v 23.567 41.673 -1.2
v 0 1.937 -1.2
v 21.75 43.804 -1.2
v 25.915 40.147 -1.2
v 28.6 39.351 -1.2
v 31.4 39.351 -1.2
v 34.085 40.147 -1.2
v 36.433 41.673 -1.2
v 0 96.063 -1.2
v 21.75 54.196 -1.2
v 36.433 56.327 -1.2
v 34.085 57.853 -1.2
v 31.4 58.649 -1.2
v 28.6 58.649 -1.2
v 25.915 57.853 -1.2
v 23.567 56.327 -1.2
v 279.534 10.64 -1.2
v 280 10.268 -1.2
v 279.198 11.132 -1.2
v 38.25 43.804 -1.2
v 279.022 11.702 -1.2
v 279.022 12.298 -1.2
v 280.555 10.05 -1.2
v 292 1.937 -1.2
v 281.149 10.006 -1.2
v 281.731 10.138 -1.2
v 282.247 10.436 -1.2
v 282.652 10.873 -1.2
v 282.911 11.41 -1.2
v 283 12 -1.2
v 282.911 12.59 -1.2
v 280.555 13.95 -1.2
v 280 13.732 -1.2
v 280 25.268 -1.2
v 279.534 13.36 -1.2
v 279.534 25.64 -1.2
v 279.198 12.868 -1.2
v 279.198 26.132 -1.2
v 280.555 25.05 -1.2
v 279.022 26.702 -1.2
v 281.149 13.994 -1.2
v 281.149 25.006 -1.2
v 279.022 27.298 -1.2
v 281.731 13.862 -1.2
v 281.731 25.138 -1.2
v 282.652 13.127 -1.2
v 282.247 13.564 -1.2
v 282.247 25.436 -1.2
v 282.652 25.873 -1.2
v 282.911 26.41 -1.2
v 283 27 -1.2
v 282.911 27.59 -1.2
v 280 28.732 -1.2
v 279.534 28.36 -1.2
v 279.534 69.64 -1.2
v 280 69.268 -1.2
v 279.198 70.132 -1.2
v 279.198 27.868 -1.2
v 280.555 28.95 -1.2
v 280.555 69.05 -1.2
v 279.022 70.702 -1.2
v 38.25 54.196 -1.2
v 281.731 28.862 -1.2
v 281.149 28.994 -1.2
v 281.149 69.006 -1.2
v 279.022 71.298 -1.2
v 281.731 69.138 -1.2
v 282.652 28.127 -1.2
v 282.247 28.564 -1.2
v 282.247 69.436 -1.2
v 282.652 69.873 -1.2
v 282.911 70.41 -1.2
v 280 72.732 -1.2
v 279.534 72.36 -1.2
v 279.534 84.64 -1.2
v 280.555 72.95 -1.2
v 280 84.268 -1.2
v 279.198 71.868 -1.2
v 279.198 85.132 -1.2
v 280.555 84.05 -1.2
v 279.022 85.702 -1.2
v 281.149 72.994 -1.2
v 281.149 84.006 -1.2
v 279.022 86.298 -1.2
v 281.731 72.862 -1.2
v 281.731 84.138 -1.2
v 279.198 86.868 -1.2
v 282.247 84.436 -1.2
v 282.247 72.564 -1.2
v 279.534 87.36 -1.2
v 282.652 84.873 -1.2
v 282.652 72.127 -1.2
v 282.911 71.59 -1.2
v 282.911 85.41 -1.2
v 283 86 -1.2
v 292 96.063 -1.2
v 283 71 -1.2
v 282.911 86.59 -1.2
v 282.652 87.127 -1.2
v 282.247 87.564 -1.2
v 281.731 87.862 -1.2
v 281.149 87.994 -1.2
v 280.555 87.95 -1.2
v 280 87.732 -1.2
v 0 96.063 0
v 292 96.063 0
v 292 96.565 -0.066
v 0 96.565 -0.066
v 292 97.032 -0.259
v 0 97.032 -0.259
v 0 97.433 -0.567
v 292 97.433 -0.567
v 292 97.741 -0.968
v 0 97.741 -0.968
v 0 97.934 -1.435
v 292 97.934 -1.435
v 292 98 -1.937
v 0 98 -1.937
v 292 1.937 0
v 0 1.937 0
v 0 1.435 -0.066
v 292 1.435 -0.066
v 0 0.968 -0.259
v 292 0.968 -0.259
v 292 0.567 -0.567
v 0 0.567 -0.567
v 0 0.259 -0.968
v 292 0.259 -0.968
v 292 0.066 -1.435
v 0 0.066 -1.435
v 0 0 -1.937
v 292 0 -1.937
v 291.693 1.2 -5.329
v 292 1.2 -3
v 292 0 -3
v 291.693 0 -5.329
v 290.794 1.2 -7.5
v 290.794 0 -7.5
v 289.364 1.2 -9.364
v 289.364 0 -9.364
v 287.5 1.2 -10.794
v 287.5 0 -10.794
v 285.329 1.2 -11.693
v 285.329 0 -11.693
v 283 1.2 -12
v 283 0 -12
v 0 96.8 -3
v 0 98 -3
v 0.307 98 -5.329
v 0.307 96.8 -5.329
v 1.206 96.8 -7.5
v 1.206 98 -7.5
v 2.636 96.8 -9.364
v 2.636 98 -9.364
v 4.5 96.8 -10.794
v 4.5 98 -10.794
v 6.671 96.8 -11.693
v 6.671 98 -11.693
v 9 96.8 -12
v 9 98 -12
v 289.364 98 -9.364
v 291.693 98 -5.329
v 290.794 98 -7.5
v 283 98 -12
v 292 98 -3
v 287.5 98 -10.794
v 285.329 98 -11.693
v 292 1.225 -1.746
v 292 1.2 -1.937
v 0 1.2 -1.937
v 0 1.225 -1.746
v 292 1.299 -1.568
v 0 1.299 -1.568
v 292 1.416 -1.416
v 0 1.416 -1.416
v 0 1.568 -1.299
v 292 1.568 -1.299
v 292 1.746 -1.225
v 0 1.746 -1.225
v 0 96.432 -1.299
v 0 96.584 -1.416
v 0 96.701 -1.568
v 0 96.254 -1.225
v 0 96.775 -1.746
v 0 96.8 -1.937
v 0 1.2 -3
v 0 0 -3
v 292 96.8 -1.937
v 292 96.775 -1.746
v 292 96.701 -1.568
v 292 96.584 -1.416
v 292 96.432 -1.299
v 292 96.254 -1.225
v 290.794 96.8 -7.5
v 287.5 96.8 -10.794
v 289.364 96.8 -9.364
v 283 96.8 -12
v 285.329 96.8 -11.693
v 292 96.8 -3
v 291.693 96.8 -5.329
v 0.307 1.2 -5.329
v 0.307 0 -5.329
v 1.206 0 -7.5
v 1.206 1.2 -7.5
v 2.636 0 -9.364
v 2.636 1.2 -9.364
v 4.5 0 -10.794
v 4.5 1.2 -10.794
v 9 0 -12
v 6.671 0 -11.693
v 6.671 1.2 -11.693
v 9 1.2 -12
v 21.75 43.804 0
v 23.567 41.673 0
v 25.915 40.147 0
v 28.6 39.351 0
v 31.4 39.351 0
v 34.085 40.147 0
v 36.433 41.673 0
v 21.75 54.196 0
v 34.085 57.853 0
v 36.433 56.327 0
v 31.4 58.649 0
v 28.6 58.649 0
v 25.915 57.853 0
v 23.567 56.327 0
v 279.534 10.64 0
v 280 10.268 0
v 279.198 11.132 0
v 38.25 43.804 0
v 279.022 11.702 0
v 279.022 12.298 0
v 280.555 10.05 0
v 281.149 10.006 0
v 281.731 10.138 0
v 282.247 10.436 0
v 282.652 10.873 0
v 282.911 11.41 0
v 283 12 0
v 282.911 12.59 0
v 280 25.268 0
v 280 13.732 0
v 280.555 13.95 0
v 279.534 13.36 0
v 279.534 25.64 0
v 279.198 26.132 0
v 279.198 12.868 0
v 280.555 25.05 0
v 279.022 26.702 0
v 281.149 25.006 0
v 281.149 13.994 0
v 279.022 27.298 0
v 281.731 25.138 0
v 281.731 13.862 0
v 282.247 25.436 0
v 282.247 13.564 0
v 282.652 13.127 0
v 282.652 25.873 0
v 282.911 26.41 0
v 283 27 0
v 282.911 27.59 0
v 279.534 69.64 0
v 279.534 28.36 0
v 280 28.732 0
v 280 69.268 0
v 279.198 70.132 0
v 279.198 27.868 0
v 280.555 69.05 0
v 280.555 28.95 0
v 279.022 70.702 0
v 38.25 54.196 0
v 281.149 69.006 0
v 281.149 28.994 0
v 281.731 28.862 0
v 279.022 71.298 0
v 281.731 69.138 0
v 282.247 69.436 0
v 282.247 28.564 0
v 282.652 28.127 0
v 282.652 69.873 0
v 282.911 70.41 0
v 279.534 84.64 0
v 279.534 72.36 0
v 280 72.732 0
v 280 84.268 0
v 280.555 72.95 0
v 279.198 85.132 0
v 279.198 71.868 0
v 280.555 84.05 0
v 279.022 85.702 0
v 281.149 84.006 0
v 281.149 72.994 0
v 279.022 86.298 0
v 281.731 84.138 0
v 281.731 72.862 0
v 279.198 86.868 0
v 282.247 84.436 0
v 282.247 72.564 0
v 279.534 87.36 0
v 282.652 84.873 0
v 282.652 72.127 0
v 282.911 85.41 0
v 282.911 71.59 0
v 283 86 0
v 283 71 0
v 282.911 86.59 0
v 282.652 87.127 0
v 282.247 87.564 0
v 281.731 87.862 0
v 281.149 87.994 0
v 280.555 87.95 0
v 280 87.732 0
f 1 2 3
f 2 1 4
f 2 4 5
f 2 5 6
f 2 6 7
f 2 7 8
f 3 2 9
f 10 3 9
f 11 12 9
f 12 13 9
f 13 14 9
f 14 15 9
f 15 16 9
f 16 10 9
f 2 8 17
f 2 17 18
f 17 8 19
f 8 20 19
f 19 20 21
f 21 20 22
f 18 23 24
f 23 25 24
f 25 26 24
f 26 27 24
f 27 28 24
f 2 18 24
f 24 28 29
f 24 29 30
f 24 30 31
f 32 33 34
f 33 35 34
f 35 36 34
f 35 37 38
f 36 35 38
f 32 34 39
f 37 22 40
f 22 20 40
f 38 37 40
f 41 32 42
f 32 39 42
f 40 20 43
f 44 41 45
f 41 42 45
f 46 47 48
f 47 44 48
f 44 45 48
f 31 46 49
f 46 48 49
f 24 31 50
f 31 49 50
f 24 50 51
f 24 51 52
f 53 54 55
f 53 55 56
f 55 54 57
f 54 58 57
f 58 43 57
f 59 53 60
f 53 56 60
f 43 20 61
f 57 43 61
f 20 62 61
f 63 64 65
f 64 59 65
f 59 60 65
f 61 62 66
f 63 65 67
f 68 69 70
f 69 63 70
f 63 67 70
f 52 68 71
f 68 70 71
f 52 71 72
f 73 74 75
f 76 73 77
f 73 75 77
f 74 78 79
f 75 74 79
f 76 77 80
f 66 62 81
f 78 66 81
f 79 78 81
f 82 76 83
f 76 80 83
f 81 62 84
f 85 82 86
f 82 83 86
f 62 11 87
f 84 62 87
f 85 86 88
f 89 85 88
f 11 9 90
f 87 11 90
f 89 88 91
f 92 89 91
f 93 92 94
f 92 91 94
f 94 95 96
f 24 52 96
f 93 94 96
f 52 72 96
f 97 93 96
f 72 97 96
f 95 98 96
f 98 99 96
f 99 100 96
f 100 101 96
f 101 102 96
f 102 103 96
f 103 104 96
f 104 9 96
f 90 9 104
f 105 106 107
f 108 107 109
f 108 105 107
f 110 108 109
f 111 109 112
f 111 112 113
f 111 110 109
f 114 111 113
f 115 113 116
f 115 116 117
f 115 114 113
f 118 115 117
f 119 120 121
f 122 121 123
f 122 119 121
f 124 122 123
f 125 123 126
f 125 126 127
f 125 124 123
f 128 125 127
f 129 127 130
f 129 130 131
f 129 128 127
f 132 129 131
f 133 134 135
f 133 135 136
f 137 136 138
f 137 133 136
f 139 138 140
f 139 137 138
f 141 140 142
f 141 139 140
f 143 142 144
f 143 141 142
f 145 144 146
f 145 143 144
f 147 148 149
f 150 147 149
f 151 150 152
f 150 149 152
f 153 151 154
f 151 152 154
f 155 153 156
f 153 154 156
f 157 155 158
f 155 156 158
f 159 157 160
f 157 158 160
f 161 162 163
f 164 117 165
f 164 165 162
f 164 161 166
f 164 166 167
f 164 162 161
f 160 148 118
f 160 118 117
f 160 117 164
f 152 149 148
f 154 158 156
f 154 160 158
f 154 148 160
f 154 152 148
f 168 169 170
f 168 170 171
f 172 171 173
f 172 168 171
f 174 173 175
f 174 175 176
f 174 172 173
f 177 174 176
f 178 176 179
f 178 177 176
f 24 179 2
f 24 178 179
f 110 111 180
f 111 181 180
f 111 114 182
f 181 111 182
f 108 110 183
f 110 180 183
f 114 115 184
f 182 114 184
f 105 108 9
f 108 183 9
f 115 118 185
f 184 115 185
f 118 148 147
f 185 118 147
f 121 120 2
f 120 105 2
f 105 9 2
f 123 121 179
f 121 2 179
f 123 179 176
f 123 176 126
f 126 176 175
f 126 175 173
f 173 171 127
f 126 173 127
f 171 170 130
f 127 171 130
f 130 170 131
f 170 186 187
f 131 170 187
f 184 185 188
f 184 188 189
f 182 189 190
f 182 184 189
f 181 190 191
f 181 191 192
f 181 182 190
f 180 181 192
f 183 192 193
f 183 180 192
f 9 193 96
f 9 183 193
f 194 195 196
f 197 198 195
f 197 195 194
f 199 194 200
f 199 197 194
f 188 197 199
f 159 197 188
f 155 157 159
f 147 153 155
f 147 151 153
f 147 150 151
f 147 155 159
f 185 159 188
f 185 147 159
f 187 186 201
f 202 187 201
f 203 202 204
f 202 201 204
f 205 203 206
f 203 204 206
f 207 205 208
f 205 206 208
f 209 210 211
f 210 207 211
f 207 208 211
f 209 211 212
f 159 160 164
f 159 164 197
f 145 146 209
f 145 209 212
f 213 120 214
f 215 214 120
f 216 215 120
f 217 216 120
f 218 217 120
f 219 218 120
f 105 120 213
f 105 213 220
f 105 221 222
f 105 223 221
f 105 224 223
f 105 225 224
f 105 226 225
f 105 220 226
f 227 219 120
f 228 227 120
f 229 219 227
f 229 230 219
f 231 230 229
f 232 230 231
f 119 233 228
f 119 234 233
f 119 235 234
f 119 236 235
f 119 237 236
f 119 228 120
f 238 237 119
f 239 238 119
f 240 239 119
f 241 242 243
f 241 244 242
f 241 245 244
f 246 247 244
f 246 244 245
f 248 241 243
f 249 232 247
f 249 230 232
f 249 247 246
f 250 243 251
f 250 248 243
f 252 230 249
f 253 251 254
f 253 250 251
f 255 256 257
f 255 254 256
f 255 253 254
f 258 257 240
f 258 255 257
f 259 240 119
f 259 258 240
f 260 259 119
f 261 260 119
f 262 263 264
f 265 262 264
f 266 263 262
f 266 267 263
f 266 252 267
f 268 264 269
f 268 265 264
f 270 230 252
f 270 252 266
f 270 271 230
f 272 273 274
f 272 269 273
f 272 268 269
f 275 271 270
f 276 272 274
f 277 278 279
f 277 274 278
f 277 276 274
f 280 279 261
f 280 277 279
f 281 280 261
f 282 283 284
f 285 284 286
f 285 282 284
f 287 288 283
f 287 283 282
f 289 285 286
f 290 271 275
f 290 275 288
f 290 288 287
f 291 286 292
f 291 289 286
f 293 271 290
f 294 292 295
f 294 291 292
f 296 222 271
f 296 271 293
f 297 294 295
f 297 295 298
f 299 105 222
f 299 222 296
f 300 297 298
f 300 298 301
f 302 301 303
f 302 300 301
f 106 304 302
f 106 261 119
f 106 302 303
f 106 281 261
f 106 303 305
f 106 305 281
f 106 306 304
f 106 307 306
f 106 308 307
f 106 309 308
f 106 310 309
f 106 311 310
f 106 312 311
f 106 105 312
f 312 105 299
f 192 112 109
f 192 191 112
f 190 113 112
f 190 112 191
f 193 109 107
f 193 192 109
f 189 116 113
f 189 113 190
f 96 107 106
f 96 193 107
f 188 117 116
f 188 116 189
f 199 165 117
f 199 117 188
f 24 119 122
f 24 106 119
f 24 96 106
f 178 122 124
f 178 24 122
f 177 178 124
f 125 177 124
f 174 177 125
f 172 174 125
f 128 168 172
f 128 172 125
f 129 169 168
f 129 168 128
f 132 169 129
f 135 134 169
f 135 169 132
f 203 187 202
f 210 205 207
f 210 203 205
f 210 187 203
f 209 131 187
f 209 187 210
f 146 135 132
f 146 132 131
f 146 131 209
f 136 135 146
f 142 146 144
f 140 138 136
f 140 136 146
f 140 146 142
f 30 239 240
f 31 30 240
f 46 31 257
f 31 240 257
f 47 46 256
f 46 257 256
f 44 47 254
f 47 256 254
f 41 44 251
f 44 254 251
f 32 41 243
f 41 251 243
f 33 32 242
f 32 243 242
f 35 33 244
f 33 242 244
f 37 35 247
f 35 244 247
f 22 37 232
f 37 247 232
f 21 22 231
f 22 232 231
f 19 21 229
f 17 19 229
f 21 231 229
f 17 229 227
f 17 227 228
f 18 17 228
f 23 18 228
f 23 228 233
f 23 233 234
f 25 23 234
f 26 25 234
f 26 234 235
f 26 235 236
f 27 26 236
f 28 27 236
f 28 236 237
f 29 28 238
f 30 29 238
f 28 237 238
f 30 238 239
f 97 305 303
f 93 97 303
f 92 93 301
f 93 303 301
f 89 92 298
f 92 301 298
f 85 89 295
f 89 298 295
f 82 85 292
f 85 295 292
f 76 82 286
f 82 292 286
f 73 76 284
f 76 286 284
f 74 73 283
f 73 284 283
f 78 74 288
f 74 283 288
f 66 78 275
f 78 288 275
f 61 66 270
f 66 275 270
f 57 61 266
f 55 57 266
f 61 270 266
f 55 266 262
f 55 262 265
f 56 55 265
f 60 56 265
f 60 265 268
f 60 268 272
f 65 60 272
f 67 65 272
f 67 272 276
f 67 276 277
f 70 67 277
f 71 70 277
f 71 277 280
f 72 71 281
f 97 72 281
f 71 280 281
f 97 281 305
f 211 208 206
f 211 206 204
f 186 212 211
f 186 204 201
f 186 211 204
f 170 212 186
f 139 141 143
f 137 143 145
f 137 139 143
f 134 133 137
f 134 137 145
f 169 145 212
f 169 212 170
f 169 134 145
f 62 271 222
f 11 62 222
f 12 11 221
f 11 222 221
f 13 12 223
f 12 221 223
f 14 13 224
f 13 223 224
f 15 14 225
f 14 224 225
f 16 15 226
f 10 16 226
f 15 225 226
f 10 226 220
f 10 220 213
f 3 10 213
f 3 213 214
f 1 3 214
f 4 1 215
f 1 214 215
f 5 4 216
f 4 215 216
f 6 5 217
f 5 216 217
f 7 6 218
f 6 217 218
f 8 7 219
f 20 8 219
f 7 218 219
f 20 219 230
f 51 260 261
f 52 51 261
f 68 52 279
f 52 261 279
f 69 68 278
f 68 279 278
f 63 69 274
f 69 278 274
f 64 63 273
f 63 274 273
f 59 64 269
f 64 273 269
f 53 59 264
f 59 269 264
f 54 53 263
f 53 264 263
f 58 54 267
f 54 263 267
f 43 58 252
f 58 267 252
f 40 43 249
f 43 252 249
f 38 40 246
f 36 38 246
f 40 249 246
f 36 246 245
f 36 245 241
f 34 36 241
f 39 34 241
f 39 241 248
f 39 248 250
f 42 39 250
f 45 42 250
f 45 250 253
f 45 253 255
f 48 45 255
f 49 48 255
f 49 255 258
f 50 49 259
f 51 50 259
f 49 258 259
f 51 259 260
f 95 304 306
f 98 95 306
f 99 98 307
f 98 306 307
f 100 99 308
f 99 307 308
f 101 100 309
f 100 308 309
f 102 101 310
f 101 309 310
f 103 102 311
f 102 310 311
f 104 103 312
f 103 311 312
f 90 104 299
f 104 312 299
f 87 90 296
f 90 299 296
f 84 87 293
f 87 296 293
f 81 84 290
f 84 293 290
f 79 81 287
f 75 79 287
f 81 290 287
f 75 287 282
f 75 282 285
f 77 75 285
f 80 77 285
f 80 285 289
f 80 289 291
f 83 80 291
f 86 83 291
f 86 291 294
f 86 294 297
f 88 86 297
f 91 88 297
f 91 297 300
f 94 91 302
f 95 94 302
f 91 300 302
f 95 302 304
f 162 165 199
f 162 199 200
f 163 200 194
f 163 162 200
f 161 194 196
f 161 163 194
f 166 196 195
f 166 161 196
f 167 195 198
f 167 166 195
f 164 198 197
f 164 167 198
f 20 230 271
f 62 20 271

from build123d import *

# Parameters (mm, degrees)
SKETCH_1_W                         = 292
SKETCH_1_H                         = 98
SKETCH_1_R                         = 2
SM_BASE_FLANGE_1_DEPTH             = 1.2
SM_EDGE_FLANGE_1_STRIP_W           = 6.2732
SM_EDGE_FLANGE_1_STRIP_H           = 1.2
SM_EDGE_FLANGE_1_STRIP_CUT_DEPTH   = 292
SM_EDGE_FLANGE_1_STRIP_2_W         = 6.2732
SM_EDGE_FLANGE_1_STRIP_2_H         = 1.2
SM_EDGE_FLANGE_1_STRIP_CUT_2_DEPTH = 292
SM_EDGE_FLANGE_1_DEPTH             = 292
SM_EDGE_FLANGE_1_BEND_DEPTH        = 292
CUT_EXTRUDE_1_DEPTH                = 309.240166104


# Sheet-metal steps are written as plain solids
with BuildPart() as part:
    # Sketch 1 → Базовая кромка1 (new body)
    with BuildSketch(Plane.XY):
        with Locations((146, 49)):
            Rectangle(SKETCH_1_W, SKETCH_1_H)
        with Locations((281, 86)):
            Circle(SKETCH_1_R, mode=Mode.SUBTRACT)
        with Locations((281, 71)):
            Circle(SKETCH_1_R, mode=Mode.SUBTRACT)
        with Locations((281, 27)):
            Circle(SKETCH_1_R, mode=Mode.SUBTRACT)
        with Locations((281, 12)):
            Circle(SKETCH_1_R, mode=Mode.SUBTRACT)
        with BuildLine():
            Line((21.75, 54.196152423), (21.75, 43.803847577))
            ThreePointArc((21.75, 43.803847577), (30, 39.25), (38.25, 43.803847577))
            Line((38.25, 43.803847577), (38.25, 54.196152423))
            ThreePointArc((38.25, 54.196152423), (30, 58.75), (21.75, 54.196152423))
        make_face(mode=Mode.SUBTRACT)
    extrude(amount=-SM_BASE_FLANGE_1_DEPTH)

    # Ребро-кромка1 strip (across the edge) → Ребро-кромка1 strip cut (cut)
    with BuildSketch(Plane(origin=(0, 98, -1.2), x_dir=(0, -1, 0), z_dir=(1, 0, 0))):
        with Locations((-1.2, -0.6)):
            Rectangle(SM_EDGE_FLANGE_1_STRIP_W, SM_EDGE_FLANGE_1_STRIP_H)
    extrude(amount=SM_EDGE_FLANGE_1_STRIP_CUT_DEPTH, mode=Mode.SUBTRACT)

    # Ребро-кромка1 strip 2 (across the edge) → Ребро-кромка1 strip cut 2 (cut)
    with BuildSketch(Plane(origin=(292, 0, -1.2), x_dir=(0, 1, 0), z_dir=(-1, 0, 0))):
        with Locations((-1.2, -0.6)):
            Rectangle(SM_EDGE_FLANGE_1_STRIP_2_W, SM_EDGE_FLANGE_1_STRIP_2_H)
    extrude(amount=SM_EDGE_FLANGE_1_STRIP_CUT_2_DEPTH, mode=Mode.SUBTRACT)

    # Ребро-кромка1 section (across the edge) → Ребро-кромка1 (add)
    with BuildSketch(Plane(origin=(0, 98, -1.2), x_dir=(0, -1, 0), z_dir=(1, 0, 0))):
        with BuildLine():
            Line((0, 0.7366), (0, 10.8))
            Line((0, 10.8), (1.2, 10.8))
            Line((1.2, 10.8), (1.2, 0.7366))
            ThreePointArc((1.2, 0.7366), (1.415745145, 0.215745145), (1.9366, 0))
            Line((1.9366, 0), (1.9366, -1.2))
            ThreePointArc((1.9366, -1.2), (0.567217008, -0.632782992), (0, 0.7366))
        make_face()
    extrude(amount=SM_EDGE_FLANGE_1_DEPTH)

    # Ребро-кромка1 section 2 (across the edge) → Ребро-кромка1 bend (add)
    with BuildSketch(Plane(origin=(292, 0, -1.2), x_dir=(0, 1, 0), z_dir=(-1, 0, 0))):
        with BuildLine():
            Line((0, 0.7366), (0, 10.8))
            Line((0, 10.8), (1.2, 10.8))
            Line((1.2, 10.8), (1.2, 0.7366))
            ThreePointArc((1.2, 0.7366), (1.415745145, 0.215745145), (1.9366, 0))
            Line((1.9366, 0), (1.9366, -1.2))
            ThreePointArc((1.9366, -1.2), (0.567217008, -0.632782992), (0, 0.7366))
        make_face()
    extrude(amount=SM_EDGE_FLANGE_1_BEND_DEPTH)

    # Эскиз12 → Вырез-Вытянуть1 (cut, through all)
    with BuildSketch(Plane(origin=(0, 98, 0), x_dir=(1, 0, 0), z_dir=(0, 1, 0))):
        with BuildLine():
            Line((9, 12), (0, 12))
            Line((0, 12), (0, 3))
            ThreePointArc((0, 3), (2.636038969, 9.363961031), (9, 12))
        make_face()
        with BuildLine():
            Line((283, 12), (292, 12))
            Line((292, 12), (292, 3))
            ThreePointArc((292, 3), (289.363961031, 9.363961031), (283, 12))
        make_face()
    extrude(amount=-CUT_EXTRUDE_1_DEPTH, mode=Mode.SUBTRACT)


solid = part.part
